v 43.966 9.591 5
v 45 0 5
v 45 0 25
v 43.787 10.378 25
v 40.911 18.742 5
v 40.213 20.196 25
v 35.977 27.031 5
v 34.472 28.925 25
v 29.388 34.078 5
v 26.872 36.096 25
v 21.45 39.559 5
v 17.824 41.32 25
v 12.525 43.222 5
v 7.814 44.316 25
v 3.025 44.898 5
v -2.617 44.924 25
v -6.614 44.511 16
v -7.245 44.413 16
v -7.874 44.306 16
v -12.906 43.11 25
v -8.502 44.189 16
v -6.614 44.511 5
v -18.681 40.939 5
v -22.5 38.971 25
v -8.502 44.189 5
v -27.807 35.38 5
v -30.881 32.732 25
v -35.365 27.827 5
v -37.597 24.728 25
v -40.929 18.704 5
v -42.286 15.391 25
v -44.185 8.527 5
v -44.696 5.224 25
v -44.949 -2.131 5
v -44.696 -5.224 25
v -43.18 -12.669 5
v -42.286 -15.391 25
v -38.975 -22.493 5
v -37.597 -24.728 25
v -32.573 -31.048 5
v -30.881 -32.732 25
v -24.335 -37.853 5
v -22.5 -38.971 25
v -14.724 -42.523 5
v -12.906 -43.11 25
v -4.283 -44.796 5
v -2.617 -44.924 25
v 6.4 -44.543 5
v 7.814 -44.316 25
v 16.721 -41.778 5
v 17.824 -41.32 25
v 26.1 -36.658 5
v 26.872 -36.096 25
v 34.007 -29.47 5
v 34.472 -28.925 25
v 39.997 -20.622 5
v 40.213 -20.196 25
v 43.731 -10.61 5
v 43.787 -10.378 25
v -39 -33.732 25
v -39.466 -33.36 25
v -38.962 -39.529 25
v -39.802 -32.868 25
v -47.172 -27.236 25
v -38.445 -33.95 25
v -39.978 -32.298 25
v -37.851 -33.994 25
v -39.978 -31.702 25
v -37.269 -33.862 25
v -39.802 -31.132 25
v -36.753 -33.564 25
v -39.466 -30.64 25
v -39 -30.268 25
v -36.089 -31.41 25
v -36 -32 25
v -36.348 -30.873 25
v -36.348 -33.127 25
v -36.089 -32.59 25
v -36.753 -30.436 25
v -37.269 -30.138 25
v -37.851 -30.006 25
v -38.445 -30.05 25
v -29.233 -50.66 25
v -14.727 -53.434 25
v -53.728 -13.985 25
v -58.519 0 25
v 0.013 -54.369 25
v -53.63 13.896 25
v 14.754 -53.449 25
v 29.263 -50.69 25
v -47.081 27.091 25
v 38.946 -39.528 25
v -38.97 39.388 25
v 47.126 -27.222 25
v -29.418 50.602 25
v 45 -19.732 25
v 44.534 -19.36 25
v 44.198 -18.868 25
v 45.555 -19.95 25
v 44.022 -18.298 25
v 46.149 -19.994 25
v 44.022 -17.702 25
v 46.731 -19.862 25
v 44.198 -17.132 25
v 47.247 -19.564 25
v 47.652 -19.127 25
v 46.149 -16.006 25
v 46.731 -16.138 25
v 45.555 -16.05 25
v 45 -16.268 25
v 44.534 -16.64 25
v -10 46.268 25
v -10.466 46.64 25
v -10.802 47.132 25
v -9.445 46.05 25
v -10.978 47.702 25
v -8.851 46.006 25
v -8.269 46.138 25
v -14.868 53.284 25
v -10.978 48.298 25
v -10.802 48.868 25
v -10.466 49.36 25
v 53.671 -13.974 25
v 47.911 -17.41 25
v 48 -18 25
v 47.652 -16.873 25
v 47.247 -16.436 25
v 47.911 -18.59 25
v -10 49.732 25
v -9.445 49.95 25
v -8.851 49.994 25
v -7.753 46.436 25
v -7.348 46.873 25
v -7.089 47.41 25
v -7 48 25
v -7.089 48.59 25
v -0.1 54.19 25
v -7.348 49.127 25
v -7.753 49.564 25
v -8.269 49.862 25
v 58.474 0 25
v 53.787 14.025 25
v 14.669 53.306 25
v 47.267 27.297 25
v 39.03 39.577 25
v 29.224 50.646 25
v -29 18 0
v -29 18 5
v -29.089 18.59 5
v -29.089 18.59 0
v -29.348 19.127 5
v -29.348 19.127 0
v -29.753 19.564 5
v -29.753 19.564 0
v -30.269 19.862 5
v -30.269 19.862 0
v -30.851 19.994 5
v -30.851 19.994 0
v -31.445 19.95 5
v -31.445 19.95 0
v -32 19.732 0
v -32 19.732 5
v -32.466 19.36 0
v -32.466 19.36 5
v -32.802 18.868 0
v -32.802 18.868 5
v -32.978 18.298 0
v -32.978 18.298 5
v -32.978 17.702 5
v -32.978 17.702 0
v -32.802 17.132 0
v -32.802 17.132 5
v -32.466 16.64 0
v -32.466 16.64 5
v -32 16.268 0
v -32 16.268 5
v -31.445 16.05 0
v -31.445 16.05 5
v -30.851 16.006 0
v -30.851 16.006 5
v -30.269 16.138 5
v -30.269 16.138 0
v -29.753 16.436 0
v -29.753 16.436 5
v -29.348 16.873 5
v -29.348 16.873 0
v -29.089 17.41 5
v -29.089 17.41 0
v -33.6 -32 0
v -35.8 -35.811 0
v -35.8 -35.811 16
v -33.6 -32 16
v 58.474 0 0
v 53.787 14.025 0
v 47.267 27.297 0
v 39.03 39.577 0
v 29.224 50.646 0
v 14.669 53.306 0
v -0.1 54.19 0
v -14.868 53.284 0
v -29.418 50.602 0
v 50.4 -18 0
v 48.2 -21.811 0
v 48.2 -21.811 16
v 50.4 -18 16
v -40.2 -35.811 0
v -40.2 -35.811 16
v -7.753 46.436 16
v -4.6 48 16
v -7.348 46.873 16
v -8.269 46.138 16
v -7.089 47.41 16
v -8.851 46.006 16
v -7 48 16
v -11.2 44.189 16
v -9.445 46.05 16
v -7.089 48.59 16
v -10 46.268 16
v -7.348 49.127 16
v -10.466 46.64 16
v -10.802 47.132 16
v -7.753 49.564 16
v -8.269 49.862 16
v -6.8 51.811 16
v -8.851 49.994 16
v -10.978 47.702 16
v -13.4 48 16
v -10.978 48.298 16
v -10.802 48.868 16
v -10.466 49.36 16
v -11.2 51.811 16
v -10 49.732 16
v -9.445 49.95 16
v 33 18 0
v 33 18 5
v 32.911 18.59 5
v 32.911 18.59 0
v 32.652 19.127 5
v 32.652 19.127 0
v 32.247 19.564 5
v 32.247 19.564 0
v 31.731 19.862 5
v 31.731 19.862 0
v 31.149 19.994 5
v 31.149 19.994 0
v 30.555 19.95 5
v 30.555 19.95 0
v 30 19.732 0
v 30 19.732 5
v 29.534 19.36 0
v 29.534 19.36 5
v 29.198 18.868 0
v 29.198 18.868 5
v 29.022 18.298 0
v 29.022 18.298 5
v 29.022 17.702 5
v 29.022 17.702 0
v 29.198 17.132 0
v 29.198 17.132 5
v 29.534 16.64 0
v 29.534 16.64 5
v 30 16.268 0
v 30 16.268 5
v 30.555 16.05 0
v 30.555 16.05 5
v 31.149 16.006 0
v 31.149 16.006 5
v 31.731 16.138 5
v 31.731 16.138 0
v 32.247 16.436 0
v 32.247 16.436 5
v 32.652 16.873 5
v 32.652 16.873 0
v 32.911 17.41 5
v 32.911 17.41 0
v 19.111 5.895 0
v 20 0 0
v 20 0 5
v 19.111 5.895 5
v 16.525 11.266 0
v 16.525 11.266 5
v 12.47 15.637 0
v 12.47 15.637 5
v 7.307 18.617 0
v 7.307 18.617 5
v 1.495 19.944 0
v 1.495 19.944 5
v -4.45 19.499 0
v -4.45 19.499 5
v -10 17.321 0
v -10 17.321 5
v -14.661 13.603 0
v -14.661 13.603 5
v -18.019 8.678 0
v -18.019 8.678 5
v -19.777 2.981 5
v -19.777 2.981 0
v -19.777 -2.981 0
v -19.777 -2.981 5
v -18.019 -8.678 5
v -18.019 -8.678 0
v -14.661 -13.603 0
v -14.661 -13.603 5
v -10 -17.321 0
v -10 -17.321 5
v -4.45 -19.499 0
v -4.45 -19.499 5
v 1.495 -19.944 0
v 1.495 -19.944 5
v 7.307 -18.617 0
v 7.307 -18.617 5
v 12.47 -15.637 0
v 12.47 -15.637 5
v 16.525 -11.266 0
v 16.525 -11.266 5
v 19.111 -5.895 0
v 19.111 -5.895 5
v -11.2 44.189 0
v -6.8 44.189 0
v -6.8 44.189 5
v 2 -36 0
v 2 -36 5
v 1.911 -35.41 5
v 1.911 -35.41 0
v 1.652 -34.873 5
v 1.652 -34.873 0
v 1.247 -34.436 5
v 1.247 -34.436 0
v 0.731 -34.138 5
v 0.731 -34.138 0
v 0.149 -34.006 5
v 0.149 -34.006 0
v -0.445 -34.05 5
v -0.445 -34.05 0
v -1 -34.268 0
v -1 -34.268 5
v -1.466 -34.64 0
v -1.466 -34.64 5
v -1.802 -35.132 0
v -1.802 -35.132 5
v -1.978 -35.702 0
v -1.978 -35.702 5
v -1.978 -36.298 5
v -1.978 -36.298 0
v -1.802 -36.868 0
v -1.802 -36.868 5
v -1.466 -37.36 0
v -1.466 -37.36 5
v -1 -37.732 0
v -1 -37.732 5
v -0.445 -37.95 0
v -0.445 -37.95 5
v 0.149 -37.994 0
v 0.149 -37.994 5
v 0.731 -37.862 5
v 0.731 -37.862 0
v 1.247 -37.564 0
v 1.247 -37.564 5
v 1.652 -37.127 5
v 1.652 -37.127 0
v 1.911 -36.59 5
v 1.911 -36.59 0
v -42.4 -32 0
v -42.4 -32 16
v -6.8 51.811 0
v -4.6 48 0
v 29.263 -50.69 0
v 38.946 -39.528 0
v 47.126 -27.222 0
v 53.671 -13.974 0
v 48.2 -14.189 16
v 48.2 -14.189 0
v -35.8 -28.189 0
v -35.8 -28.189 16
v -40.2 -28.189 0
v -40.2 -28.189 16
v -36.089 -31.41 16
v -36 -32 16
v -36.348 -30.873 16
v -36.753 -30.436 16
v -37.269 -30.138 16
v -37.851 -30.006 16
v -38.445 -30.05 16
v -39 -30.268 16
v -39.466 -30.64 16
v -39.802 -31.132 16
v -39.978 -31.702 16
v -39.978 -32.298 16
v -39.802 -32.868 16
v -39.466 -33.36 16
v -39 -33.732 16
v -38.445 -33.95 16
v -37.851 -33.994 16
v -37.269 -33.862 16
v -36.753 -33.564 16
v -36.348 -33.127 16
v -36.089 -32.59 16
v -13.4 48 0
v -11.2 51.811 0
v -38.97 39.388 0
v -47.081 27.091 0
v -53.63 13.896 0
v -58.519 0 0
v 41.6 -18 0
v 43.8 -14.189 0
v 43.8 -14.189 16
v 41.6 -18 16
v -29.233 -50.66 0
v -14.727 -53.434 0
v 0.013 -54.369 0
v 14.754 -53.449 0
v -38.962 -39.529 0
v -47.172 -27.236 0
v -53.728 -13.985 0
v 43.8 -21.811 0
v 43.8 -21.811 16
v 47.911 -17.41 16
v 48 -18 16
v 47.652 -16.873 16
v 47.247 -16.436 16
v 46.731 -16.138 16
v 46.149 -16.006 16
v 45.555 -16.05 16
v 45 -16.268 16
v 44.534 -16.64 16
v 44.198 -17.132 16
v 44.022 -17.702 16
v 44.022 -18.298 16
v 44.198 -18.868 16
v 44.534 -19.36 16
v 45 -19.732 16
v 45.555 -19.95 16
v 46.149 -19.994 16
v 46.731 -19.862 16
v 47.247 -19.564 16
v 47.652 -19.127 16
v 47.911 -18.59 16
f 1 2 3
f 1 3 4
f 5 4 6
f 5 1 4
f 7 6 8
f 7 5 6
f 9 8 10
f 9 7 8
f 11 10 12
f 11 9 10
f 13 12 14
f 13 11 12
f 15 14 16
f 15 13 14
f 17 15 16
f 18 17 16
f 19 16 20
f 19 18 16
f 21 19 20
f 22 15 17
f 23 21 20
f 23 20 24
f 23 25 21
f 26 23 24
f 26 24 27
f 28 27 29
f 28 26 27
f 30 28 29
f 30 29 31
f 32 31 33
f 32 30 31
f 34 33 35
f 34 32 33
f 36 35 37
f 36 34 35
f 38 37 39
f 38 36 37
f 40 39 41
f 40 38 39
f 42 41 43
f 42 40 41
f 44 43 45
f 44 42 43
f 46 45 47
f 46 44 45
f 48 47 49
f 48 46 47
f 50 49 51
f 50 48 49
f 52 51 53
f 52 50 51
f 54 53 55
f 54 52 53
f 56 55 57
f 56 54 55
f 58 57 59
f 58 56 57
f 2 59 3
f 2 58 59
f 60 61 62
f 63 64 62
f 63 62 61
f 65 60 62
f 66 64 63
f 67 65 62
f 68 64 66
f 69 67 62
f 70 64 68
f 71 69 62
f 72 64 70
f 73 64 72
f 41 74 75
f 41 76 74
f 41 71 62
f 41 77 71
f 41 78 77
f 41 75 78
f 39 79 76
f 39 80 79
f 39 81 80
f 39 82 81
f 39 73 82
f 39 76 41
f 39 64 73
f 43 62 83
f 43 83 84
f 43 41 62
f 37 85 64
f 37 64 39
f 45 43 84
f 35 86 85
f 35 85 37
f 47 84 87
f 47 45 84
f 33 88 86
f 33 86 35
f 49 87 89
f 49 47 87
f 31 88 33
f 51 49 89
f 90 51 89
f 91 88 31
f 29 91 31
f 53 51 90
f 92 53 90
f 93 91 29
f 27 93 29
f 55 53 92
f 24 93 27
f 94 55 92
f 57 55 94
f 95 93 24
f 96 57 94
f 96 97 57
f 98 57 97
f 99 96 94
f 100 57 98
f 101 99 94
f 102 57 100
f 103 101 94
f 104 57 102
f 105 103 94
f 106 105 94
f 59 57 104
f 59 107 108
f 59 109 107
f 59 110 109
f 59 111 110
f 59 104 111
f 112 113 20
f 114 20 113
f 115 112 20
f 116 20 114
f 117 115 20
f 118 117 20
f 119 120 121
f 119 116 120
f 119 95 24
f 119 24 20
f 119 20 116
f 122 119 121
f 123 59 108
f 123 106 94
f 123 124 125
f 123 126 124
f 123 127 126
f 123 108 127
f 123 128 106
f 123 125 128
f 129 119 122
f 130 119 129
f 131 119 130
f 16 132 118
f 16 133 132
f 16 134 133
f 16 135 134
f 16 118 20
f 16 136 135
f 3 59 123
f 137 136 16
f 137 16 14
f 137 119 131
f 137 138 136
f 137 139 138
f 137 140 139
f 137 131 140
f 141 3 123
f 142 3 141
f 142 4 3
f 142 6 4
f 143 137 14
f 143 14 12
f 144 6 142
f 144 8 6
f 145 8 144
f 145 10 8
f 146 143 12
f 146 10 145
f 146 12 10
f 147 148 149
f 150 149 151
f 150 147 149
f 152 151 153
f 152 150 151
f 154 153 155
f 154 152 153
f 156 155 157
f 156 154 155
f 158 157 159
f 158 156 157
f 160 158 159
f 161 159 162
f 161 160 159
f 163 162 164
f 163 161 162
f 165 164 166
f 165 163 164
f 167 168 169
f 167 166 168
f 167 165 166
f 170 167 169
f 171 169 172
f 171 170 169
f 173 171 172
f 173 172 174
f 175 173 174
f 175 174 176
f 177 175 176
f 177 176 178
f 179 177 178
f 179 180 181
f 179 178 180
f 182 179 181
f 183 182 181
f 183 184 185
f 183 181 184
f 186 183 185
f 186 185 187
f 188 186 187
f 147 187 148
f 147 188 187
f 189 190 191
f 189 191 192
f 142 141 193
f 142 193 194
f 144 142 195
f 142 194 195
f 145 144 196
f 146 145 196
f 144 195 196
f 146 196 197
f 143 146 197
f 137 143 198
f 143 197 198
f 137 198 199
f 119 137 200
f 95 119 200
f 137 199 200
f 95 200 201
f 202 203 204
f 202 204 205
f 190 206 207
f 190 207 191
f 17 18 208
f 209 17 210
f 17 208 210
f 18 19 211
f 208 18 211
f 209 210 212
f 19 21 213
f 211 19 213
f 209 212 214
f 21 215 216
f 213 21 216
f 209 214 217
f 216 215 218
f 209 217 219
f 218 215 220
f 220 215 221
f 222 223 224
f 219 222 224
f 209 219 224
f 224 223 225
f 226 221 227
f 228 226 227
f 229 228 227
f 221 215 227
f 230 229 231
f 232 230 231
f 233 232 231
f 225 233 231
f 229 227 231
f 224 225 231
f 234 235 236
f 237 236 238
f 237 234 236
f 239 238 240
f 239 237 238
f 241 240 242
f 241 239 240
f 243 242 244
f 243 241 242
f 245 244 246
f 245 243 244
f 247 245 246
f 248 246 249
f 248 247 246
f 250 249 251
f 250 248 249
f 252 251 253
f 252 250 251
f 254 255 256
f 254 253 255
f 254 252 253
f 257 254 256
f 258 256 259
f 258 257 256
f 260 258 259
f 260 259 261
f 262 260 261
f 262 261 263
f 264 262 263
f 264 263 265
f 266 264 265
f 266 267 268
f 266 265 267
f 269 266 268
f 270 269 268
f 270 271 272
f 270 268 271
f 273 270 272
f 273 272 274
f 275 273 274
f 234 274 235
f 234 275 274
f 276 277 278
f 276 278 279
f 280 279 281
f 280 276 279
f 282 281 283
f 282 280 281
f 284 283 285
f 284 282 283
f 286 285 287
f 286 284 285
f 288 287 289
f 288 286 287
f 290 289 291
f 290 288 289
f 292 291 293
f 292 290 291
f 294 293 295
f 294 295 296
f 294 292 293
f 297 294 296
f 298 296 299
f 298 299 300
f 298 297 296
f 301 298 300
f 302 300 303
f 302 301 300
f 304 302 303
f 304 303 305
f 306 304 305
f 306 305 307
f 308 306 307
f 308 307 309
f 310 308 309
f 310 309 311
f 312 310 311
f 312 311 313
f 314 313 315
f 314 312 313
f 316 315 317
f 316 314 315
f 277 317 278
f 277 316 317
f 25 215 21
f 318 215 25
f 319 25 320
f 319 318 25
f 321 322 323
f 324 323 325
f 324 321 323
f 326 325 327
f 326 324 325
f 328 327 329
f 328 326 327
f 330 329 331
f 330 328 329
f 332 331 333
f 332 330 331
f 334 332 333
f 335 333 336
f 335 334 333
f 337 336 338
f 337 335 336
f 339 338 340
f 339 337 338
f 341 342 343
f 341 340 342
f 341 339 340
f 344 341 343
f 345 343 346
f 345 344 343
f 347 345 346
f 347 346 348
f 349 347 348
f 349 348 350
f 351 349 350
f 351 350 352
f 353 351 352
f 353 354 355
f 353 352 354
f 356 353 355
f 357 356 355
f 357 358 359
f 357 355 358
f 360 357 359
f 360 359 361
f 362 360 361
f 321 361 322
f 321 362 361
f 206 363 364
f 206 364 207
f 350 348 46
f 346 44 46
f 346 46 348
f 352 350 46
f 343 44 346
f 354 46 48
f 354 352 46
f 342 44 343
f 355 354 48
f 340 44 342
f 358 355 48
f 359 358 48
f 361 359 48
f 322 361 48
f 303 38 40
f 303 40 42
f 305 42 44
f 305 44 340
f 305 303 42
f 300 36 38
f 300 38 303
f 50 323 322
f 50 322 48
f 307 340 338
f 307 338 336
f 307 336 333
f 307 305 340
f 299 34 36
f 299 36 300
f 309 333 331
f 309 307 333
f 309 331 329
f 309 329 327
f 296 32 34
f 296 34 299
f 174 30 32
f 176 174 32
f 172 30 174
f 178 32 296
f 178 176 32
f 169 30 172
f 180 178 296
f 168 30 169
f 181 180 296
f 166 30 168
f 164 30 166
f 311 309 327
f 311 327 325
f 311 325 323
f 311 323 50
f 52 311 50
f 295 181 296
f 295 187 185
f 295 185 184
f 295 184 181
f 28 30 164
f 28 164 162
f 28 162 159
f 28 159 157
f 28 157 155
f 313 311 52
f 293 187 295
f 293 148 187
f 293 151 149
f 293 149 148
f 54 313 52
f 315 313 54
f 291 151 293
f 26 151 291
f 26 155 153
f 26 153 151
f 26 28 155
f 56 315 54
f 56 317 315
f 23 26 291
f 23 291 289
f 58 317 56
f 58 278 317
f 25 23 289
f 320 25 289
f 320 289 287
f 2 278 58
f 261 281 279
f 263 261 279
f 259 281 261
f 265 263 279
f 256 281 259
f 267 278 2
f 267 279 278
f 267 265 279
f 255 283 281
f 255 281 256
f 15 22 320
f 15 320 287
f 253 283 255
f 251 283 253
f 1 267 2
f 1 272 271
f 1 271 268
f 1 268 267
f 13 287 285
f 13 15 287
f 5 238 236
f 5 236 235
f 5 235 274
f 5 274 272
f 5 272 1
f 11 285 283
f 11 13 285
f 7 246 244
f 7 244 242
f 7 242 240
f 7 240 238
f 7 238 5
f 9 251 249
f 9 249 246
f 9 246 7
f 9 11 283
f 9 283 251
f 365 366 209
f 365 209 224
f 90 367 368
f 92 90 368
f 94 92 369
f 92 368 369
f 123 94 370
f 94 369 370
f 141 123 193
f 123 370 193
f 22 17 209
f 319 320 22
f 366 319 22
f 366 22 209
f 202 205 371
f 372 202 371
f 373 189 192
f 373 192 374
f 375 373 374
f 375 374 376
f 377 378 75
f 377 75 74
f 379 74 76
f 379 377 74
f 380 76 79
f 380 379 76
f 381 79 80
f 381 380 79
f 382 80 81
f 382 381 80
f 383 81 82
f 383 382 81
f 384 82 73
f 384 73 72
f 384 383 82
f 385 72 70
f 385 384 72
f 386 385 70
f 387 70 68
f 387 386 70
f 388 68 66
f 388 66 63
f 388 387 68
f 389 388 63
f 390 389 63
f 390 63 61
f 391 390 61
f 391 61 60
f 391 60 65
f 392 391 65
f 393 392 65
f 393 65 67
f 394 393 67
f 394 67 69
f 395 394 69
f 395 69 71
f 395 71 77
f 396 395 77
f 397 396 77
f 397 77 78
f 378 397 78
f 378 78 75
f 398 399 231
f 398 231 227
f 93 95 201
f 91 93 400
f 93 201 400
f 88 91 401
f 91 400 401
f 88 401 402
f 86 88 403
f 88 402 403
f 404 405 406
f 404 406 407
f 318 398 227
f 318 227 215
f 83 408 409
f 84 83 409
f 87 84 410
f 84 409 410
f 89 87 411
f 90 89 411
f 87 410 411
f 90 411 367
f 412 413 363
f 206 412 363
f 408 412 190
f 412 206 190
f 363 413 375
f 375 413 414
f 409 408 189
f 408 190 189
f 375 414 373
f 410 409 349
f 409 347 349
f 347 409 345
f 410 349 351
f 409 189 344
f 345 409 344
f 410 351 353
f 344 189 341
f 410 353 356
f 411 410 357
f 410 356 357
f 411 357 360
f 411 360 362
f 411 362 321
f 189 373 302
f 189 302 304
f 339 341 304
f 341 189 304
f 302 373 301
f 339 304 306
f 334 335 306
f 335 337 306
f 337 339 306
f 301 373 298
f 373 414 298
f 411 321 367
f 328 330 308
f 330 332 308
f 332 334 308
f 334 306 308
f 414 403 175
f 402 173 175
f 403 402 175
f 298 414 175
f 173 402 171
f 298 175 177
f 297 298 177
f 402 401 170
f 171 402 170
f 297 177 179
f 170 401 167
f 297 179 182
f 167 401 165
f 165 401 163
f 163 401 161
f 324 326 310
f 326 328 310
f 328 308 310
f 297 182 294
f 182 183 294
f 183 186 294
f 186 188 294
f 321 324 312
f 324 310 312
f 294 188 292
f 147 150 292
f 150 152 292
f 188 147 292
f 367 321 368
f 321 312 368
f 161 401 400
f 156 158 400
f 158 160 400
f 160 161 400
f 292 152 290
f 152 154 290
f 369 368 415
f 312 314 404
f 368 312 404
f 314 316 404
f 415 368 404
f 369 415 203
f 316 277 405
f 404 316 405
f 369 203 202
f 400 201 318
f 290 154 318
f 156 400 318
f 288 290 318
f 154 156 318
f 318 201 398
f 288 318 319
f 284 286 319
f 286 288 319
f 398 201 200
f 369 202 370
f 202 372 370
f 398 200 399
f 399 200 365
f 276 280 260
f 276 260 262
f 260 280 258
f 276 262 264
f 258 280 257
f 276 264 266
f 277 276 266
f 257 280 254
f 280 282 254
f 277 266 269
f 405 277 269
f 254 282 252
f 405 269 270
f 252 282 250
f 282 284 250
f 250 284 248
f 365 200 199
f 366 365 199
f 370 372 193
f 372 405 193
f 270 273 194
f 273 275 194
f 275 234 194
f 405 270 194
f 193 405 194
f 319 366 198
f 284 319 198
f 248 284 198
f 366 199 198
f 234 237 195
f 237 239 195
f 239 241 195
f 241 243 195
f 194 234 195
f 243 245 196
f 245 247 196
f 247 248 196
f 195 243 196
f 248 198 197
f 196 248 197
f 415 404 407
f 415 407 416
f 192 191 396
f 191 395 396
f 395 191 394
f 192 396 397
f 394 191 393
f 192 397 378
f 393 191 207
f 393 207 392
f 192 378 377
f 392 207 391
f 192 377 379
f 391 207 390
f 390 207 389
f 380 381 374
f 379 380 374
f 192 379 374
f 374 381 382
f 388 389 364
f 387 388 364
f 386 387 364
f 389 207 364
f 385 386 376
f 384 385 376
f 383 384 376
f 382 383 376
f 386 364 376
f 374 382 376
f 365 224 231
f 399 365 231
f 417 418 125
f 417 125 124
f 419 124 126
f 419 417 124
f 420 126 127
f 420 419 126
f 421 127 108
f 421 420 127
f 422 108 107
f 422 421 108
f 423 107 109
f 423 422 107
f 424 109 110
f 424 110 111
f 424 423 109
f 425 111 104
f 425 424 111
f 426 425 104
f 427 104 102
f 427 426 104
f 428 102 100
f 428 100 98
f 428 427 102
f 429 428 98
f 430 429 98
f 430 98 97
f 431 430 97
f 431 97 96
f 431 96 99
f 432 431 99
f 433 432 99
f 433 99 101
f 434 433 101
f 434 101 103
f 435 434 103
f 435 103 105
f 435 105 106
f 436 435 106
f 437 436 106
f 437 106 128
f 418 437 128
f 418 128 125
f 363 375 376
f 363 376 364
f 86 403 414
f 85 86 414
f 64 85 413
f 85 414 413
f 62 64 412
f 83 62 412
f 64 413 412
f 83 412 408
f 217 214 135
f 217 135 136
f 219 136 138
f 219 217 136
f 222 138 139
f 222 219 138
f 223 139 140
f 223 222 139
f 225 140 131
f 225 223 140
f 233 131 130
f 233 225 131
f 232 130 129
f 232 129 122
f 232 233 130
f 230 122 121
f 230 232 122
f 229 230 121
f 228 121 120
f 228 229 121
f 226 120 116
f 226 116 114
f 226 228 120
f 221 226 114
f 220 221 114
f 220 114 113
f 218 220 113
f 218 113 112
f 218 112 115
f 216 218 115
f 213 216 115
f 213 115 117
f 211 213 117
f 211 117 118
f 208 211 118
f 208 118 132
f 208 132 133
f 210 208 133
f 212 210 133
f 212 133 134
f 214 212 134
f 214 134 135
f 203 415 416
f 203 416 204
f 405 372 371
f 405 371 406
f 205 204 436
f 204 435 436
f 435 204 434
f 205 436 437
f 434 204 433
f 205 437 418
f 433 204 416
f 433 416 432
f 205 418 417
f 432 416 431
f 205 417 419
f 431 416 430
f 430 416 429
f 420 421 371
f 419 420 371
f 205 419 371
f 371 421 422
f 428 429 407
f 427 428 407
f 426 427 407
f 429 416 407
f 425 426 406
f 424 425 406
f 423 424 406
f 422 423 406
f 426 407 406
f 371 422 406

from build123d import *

# Parameters (mm, degrees)
CYLINDER006_R     = 2
CYLINDER006_DEPTH = 20
CYLINDER007_R     = 2
CYLINDER007_DEPTH = 20
CYLINDER005_R     = 2
CYLINDER005_DEPTH = 20
EXTRUDE003_DEPTH  = 16
EXTRUDE002_DEPTH  = 16
EXTRUDE001_DEPTH  = 16
CYLINDER004_R     = 2
CYLINDER004_DEPTH = 25
CYLINDER003_R     = 2
CYLINDER003_DEPTH = 25
CYLINDER002_R     = 2
CYLINDER002_DEPTH = 25
CYLINDER001_R     = 20
CYLINDER001_DEPTH = 5
CYLINDER_R        = 45
CYLINDER_DEPTH    = 20
EXTRUDE_DEPTH     = 25


with BuildPart() as cylinder006:
    # Cylinder006 → Cylinder006 (new body)
    with BuildSketch(Plane(origin=(-31, 18, 0), x_dir=(1, 0, 0), z_dir=(0, 0, 1))):
        Circle(CYLINDER006_R)
    extrude(amount=CYLINDER006_DEPTH)


with BuildPart() as cylinder007:
    # Cylinder007 → Cylinder007 (new body)
    with BuildSketch(Plane(origin=(0, -36, 0), x_dir=(1, 0, 0), z_dir=(0, 0, 1))):
        Circle(CYLINDER007_R)
    extrude(amount=CYLINDER007_DEPTH)


with BuildPart() as cylinder005:
    # Cylinder005 → Cylinder005 (new body)
    with BuildSketch(Plane(origin=(31, 18, 0), x_dir=(1, 0, 0), z_dir=(0, 0, 1))):
        Circle(CYLINDER005_R)
    extrude(amount=CYLINDER005_DEPTH)


with BuildPart() as extrude003:
    # RegularPolygon002 → Extrude003 (new body)
    with BuildSketch(Plane(origin=(46, -18, 0), x_dir=(0, 1, 0), z_dir=(0, 0, 1))):
        Polygon((0, -4.4), (3.810512, -2.2), (3.810512, 2.2), (0, 4.4), (-3.810512, 2.2), (-3.810512, -2.2), align=None)
    extrude(amount=EXTRUDE003_DEPTH)


with BuildPart() as extrude002:
    # RegularPolygon001 → Extrude002 (new body)
    with BuildSketch(Plane(origin=(-9, 48, 0), x_dir=(0, 1, 0), z_dir=(0, 0, 1))):
        Polygon((0, -4.4), (3.810512, -2.2), (3.810512, 2.2), (0, 4.4), (-3.810512, 2.2), (-3.810512, -2.2), align=None)
    extrude(amount=EXTRUDE002_DEPTH)


with BuildPart() as extrude001:
    # RegularPolygon → Extrude001 (new body)
    with BuildSketch(Plane(origin=(-38, -32, 0), x_dir=(0, 1, 0), z_dir=(0, 0, 1))):
        Polygon((0, -4.4), (3.810512, -2.2), (3.810512, 2.2), (0, 4.4), (-3.810512, 2.2), (-3.810512, -2.2), align=None)
    extrude(amount=EXTRUDE001_DEPTH)


with BuildPart() as cylinder004:
    # Cylinder004 → Cylinder004 (new body)
    with BuildSketch(Plane(origin=(46, -18, 0), x_dir=(1, 0, 0), z_dir=(0, 0, 1))):
        Circle(CYLINDER004_R)
    extrude(amount=CYLINDER004_DEPTH)


with BuildPart() as cylinder003:
    # Cylinder003 → Cylinder003 (new body)
    with BuildSketch(Plane(origin=(-9, 48, 0), x_dir=(1, 0, 0), z_dir=(0, 0, 1))):
        Circle(CYLINDER003_R)
    extrude(amount=CYLINDER003_DEPTH)


with BuildPart() as cylinder002:
    # Cylinder002 → Cylinder002 (new body)
    with BuildSketch(Plane(origin=(-38, -32, 0), x_dir=(1, 0, 0), z_dir=(0, 0, 1))):
        Circle(CYLINDER002_R)
    extrude(amount=CYLINDER002_DEPTH)


with BuildPart() as cylinder001:
    # Cylinder001 → Cylinder001 (new body)
    with BuildSketch(Plane.XY):
        Circle(CYLINDER001_R)
    extrude(amount=CYLINDER001_DEPTH)


with BuildPart() as cylinder:
    # Cylinder → Cylinder (new body)
    with BuildSketch(Plane.XY.offset(5)):
        Circle(CYLINDER_R)
    extrude(amount=CYLINDER_DEPTH)


with BuildPart() as cut010:
    # Sketch → Extrude (new body)
    with BuildSketch(Plane.XY):
        with BuildLine():
            ThreePointArc((-58.518876, 0), (-47.172244, -27.235666), (-29.233044, -50.660282))
            ThreePointArc((-29.233044, -50.660282), (0.013292, -54.368862), (29.263356, -50.689798))
            ThreePointArc((29.263356, -50.689798), (47.126286, -27.222202), (58.473712, 0))
            ThreePointArc((58.473712, 0), (47.267042, 27.297009), (29.223904, 50.645699))
            ThreePointArc((29.223904, 50.645699), (-0.099691, 54.190035), (-29.41792, 50.601573))
            ThreePointArc((-29.41792, 50.601573), (-47.081429, 27.09109), (-58.518876, 0))
        make_face()
    extrude(amount=EXTRUDE_DEPTH)

    # Cut: cut Cylinder
    add(cylinder.part, mode=Mode.SUBTRACT)

    # Cut001: cut Cylinder001
    add(cylinder001.part, mode=Mode.SUBTRACT)

    # Cut002: cut Cylinder002
    add(cylinder002.part, mode=Mode.SUBTRACT)

    # Cut003: cut Cylinder003
    add(cylinder003.part, mode=Mode.SUBTRACT)

    # Cut004: cut Cylinder004
    add(cylinder004.part, mode=Mode.SUBTRACT)

    # Cut005: cut Extrude001
    add(extrude001.part, mode=Mode.SUBTRACT)

    # Cut006: cut Extrude002
    add(extrude002.part, mode=Mode.SUBTRACT)

    # Cut007: cut Extrude003
    add(extrude003.part, mode=Mode.SUBTRACT)

    # Cut008: cut Cylinder005
    add(cylinder005.part, mode=Mode.SUBTRACT)

    # Cut009: cut Cylinder007
    add(cylinder007.part, mode=Mode.SUBTRACT)

    # Cut010: cut Cylinder006
    add(cylinder006.part, mode=Mode.SUBTRACT)


solid = cut010.part
